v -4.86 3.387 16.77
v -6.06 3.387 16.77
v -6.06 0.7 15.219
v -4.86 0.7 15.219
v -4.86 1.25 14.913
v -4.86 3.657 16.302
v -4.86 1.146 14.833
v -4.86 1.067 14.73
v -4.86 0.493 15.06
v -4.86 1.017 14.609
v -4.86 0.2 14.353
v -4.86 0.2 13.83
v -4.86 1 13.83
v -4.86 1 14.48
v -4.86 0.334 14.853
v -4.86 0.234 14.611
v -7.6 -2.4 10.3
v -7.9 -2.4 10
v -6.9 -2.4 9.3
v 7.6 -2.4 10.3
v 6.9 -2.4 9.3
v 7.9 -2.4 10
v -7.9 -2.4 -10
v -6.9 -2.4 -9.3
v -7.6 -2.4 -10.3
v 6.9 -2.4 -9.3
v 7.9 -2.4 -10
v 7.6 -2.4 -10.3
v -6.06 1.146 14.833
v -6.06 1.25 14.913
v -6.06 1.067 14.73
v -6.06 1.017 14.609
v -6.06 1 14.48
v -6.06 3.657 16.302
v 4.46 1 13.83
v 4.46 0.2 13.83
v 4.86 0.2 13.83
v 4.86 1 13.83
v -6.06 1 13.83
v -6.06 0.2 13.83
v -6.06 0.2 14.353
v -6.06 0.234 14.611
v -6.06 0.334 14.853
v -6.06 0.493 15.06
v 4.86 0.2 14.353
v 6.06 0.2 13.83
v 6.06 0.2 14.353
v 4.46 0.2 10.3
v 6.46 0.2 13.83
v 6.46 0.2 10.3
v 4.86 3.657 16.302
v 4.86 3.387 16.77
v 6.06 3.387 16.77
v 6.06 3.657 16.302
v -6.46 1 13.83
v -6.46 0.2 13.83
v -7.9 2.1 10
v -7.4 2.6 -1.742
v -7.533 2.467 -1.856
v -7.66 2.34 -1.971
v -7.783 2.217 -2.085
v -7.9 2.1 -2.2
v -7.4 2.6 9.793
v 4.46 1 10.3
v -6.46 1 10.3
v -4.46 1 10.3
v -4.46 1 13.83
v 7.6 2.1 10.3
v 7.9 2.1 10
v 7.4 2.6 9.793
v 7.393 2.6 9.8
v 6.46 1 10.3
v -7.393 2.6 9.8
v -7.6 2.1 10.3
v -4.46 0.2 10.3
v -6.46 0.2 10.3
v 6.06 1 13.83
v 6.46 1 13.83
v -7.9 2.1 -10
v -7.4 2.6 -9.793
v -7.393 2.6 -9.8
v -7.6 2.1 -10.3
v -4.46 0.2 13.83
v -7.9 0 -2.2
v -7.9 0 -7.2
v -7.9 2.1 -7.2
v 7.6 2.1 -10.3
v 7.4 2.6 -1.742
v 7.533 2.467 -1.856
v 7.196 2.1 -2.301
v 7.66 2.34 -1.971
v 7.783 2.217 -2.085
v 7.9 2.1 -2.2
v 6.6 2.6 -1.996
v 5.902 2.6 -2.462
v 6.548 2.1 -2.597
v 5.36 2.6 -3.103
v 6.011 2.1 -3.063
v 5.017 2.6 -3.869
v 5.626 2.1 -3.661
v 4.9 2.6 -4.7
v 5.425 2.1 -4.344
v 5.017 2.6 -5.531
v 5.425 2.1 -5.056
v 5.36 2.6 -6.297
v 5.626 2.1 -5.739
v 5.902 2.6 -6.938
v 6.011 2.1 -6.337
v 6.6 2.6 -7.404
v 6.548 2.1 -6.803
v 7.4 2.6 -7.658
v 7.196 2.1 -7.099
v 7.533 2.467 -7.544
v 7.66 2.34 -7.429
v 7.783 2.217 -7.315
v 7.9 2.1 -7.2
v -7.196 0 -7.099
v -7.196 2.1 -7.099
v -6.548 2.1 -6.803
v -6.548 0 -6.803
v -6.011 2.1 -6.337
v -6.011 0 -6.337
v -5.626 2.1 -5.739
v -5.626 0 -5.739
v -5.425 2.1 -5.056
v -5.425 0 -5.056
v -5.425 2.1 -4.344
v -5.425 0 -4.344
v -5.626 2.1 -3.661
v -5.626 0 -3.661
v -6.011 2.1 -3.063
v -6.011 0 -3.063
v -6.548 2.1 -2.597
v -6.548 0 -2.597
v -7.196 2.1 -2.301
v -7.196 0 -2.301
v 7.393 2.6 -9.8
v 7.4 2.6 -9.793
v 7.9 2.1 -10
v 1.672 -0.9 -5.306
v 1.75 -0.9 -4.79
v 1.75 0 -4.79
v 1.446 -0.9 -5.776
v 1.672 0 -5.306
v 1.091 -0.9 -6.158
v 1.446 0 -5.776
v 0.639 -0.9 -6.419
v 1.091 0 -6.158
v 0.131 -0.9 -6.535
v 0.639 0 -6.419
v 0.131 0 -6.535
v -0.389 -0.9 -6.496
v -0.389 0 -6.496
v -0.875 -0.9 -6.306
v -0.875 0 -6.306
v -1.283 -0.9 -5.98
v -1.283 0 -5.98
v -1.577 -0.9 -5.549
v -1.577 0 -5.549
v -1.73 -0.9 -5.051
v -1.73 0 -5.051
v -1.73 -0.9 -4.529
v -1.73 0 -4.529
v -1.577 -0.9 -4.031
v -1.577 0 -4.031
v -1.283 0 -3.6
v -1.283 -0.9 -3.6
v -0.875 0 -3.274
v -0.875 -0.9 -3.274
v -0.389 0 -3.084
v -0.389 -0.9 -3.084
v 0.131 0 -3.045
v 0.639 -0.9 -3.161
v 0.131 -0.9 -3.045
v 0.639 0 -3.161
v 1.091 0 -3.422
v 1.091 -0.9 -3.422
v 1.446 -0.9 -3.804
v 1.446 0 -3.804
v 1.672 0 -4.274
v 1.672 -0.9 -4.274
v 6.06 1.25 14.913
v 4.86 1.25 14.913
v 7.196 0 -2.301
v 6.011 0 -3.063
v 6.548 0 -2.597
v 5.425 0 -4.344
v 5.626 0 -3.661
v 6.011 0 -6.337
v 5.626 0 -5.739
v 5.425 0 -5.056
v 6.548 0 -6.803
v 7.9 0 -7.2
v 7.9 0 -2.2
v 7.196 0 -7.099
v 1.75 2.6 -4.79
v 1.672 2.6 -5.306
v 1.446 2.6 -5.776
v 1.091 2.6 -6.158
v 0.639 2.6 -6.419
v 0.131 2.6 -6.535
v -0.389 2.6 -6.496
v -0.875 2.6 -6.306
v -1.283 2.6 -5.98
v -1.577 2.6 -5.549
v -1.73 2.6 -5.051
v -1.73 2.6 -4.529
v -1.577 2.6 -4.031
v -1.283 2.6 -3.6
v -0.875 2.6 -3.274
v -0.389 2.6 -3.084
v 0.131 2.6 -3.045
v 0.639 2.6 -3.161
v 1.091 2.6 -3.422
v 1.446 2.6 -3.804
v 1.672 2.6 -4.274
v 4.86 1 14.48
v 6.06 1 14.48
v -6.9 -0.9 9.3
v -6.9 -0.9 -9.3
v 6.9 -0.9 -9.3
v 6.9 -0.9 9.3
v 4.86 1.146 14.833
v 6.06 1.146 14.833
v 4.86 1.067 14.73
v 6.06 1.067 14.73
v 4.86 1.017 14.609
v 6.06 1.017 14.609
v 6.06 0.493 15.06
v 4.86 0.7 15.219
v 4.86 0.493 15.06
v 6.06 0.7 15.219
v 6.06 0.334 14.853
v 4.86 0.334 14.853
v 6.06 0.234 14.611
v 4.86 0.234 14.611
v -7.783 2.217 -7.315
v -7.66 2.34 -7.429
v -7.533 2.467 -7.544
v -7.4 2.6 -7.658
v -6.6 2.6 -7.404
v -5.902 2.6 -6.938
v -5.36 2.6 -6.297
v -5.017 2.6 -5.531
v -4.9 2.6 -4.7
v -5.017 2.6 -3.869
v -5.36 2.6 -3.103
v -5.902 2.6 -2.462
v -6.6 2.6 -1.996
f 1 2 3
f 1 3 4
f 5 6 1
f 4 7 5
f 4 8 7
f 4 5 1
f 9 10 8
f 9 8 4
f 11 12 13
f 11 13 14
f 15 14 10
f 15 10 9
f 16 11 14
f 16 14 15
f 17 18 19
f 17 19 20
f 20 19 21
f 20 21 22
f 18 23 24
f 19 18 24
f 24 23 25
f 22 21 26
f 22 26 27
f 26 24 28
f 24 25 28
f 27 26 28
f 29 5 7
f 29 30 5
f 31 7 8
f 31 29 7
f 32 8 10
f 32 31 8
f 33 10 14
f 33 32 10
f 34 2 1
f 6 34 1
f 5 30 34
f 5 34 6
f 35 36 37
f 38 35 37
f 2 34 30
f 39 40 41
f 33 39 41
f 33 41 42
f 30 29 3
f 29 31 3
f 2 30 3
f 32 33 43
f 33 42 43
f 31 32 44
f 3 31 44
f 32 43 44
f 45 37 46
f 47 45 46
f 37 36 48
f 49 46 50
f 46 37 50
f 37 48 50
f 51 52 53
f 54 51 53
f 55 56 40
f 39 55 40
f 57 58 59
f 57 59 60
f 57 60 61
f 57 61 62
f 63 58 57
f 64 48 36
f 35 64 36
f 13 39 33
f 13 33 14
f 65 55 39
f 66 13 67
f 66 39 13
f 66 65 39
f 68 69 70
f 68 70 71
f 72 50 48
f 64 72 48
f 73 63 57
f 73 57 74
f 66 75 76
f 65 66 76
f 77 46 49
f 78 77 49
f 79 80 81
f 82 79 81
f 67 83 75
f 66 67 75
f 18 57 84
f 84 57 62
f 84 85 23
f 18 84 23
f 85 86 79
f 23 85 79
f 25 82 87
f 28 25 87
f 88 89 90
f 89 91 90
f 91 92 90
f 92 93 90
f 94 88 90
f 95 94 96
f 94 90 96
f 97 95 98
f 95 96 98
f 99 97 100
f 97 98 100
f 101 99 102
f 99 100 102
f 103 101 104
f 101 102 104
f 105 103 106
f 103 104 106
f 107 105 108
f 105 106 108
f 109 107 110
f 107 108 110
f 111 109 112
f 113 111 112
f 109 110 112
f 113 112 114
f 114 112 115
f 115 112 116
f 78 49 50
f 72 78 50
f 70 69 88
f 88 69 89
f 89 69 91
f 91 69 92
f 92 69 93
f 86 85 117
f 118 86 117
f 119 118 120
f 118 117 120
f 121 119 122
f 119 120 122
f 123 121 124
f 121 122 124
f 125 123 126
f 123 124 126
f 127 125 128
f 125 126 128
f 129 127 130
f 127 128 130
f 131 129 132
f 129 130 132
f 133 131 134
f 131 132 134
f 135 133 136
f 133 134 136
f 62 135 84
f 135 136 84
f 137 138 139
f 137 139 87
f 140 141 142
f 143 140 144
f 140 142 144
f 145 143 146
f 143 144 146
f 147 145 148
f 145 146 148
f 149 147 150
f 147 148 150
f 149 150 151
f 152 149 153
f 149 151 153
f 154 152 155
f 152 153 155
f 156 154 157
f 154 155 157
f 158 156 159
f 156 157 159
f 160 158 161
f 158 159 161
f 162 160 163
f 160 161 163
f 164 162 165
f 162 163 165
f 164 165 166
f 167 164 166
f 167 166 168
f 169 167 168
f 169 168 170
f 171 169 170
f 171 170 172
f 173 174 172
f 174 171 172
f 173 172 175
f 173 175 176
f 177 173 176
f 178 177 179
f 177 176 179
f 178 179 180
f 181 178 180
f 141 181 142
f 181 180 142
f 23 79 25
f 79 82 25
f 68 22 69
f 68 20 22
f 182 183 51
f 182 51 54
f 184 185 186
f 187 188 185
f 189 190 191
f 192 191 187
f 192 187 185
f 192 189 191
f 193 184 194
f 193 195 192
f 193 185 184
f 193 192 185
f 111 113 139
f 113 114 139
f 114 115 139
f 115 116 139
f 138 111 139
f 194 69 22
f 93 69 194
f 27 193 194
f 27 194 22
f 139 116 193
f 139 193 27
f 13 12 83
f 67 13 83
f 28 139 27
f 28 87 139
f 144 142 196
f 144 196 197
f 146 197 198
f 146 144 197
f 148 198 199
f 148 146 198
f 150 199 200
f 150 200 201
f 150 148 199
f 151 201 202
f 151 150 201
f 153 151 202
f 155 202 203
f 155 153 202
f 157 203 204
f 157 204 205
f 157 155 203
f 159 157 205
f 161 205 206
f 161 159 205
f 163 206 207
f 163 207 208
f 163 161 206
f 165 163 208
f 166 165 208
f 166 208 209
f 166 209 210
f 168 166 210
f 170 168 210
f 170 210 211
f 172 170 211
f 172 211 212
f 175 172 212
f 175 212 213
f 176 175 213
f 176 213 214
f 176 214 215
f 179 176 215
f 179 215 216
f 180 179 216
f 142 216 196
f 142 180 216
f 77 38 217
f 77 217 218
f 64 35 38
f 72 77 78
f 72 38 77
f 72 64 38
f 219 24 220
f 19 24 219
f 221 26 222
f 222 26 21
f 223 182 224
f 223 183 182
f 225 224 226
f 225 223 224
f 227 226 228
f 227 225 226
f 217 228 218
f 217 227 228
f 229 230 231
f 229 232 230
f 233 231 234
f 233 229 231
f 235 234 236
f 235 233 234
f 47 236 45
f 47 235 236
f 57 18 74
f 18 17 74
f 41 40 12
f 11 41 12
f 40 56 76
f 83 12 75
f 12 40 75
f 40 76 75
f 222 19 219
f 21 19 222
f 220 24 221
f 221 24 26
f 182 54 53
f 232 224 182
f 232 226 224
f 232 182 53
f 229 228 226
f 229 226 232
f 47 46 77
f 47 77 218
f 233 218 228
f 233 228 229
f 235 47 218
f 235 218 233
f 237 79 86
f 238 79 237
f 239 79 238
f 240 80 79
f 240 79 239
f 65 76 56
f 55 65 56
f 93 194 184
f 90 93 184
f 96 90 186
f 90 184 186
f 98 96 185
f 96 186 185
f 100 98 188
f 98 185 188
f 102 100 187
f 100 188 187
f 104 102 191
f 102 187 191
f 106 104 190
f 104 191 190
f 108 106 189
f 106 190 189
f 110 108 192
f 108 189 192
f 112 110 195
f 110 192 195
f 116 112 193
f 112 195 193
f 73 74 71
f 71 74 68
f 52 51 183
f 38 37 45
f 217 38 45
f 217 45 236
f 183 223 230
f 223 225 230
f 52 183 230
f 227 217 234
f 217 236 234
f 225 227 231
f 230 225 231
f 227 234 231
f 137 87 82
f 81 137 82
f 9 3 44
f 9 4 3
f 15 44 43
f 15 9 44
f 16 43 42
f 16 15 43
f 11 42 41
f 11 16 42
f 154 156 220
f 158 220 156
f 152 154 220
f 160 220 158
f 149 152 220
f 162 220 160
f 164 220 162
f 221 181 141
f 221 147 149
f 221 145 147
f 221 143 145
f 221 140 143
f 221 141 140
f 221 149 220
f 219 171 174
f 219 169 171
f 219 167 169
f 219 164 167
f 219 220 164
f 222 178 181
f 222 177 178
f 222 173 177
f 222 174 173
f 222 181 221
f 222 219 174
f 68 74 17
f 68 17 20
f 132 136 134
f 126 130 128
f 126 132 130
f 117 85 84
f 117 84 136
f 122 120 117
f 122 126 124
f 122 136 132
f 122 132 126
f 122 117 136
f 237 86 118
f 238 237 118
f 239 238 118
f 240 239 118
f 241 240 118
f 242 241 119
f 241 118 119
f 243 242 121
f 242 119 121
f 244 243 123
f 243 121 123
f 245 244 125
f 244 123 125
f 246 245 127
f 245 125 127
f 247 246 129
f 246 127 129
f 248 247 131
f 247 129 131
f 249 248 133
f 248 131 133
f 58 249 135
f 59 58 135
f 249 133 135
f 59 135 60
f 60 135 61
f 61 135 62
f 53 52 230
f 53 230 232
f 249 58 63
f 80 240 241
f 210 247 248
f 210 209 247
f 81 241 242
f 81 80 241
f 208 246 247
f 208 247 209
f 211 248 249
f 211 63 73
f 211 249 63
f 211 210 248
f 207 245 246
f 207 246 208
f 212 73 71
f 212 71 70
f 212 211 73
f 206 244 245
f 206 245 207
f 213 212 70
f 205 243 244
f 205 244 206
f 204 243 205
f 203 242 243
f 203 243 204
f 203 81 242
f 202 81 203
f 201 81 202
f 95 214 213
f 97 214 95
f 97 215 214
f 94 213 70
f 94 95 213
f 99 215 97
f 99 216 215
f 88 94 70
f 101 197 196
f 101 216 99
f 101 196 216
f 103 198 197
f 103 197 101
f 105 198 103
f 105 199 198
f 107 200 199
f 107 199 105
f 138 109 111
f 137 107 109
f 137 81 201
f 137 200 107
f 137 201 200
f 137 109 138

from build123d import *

# Parameters (mm, degrees)
SKETCH_1_R          = 1.75
EXTRUDE_1_DEPTH     = 2.6
EXTRUDE_START       = -2.4
SKETCH_1_3_W        = 15.8
SKETCH_1_3_H        = 20.6
SKETCH_1_3_R        = 1.75
EXTRUDE_2_DEPTH     = 2.4
EXTRUDE_START_2     = 0.2
EXTRUDE_3_DEPTH     = 0.8
EXTRUDE_3_2_DEPTH   = 0.8
CHAMFER_1_SIZE      = 0.3
CHAMFER_2_SIZE      = 0.5
SKETCH_2_W          = 13.8
SKETCH_2_H          = 18.6
SKETCH_2_R          = 1.75
CUT_EXTRUDE_1_DEPTH = 1.5
SKETCH_3_W          = 1.2
SKETCH_3_H          = 0.54
EXTRUDE_6_DEPTH     = 3.68
FILLET_1_R          = 1
FILLET_2_R          = 1
FILLET_3_R          = 0.5
FILLET_4_R          = 0.5


with BuildPart() as part:
    # Эскиз1 → Бобышка-Вытянуть1 (new body)
    with BuildSketch(Plane(origin=(0, 0, 0), x_dir=(1, 0, 0), z_dir=(0, 1, 0))):
        with BuildLine():
            Line((6.46, -10.3), (7.9, -10.3))
            Line((7.9, -10.3), (7.9, 2.2))
            ThreePointArc((7.9, 2.2), (5.4, 4.7), (7.9, 7.2))
            Line((7.9, 7.2), (7.9, 10.3))
            Line((7.9, 10.3), (-7.9, 10.3))
            Line((-7.9, 10.3), (-7.9, 7.2))
            ThreePointArc((-7.9, 7.2), (-5.4, 4.7), (-7.9, 2.2))
            Line((-7.9, 2.2), (-7.9, -10.3))
            Line((-7.9, -10.3), (-6.46, -10.3))
            Line((-6.46, -10.3), (-4.46, -10.3))
            Line((-4.46, -10.3), (4.46, -10.3))
            Line((4.46, -10.3), (6.46, -10.3))
        make_face()
        with Locations((0, 4.79)):
            Circle(SKETCH_1_R, mode=Mode.SUBTRACT)
    extrude(amount=EXTRUDE_1_DEPTH)

    # Эскиз1<3> → Бобышка-Вытянуть2 (add)
    with BuildSketch(Plane(origin=(0, 0, 0), x_dir=(1, 0, 0), z_dir=(0, 1, 0)).offset(EXTRUDE_START)):
        Rectangle(SKETCH_1_3_W, SKETCH_1_3_H)
        with Locations((0, 4.79)):
            Circle(SKETCH_1_3_R, mode=Mode.SUBTRACT)
    extrude(amount=EXTRUDE_2_DEPTH)

    # Фаска1
    chamfer_1_edges = [part.edges().sort_by_distance(p)[0] for p in [
        (-7.9, 0.1, 10.3),
        (-7.9, 0.1, -10.3),
        (7.9, 0.1, -10.3),
        (7.9, 0.1, 10.3),
    ]]
    chamfer(chamfer_1_edges, length=CHAMFER_1_SIZE)

    # Фаска2
    chamfer_2_edges = [part.edges().sort_by_distance(p)[0] for p in [
        (-5.4, 2.6, -4.7),
        (-7.9, 2.6, -8.6),
        (-7.75, 2.6, -10.15),
        (0, 2.6, -10.3),
        (7.75, 2.6, -10.15),
        (7.9, 2.6, -8.6),
        (5.4, 2.6, -4.7),
        (7.9, 2.6, 3.9),
        (7.75, 2.6, 10.15),
        (0, 2.6, 10.3),
        (-7.75, 2.6, 10.15),
        (-7.9, 2.6, 3.9),
    ]]
    chamfer(chamfer_2_edges, length=CHAMFER_2_SIZE)

    # Эскиз2 → Вырез-Вытянуть1 (cut)
    with BuildSketch(Plane.XZ.offset(2.4)):
        Rectangle(SKETCH_2_W, SKETCH_2_H)
        with Locations((0, -4.79)):
            Circle(SKETCH_2_R, mode=Mode.SUBTRACT)
    extrude(amount=-CUT_EXTRUDE_1_DEPTH, mode=Mode.SUBTRACT)


with BuildPart() as body_2:
    # Эскиз1<4> → Бобышка-Вытянуть3 (new body)
    with BuildSketch(Plane(origin=(0, 0, 0), x_dir=(1, 0, 0), z_dir=(0, 1, 0)).offset(EXTRUDE_START_2)):
        Polygon((6.46, -13.83), (6.46, -10.3), (4.46, -10.3), (4.46, -13.83), (4.86, -13.83), (4.86, -14.93), (6.06, -14.93), (6.06, -13.83), align=None)
    extrude(amount=EXTRUDE_3_DEPTH)



with BuildPart() as body_3:
    # Эскиз1<4> → Extrude 3 2 (new body)
    with BuildSketch(Plane(origin=(0, 0, 0), x_dir=(1, 0, 0), z_dir=(0, 1, 0)).offset(EXTRUDE_START_2)):
        Polygon((-4.46, -13.83), (-4.46, -10.3), (-6.46, -10.3), (-6.46, -13.83), (-6.06, -13.83), (-6.06, -14.93), (-4.86, -14.93), (-4.86, -13.83), align=None)
    extrude(amount=EXTRUDE_3_2_DEPTH)


with BuildPart() as body_2_1:
    add(body_2.part)

    add(body_3.part)  # Бобышка-Вытянуть6 merges body 3
    # Эскиз3 → Бобышка-Вытянуть6 (add)
    with BuildSketch(Plane(origin=(0, 6.614879639, 3.81910254), x_dir=(1, 0, 0), z_dir=(0, -0.866025403784438, -0.500000000000001))):
        with Locations((-5.46, 12.559759279)):
            Rectangle(SKETCH_3_W, SKETCH_3_H)
        with Locations((5.46, 12.559759279)):
            Rectangle(SKETCH_3_W, SKETCH_3_H)
    extrude(amount=-EXTRUDE_6_DEPTH)

    # Скругление1
    fillet_1_edges = [body_2_1.edges().sort_by_distance(p)[0] for p in [
        (-5.46, 0.2, 14.93),
    ]]
    fillet(fillet_1_edges, radius=FILLET_1_R)

    # Скругление2
    fillet_2_edges = [body_2_1.edges().sort_by_distance(p)[0] for p in [
        (5.46, 0.2, 14.93),
    ]]
    fillet(fillet_2_edges, radius=FILLET_2_R)

    # Скругление3
    fillet_3_edges = [body_2_1.edges().sort_by_distance(p)[0] for p in [
        (5.46, 1, 14.768341925),
    ]]
    fillet(fillet_3_edges, radius=FILLET_3_R)

    # Скругление4
    fillet_4_edges = [body_2_1.edges().sort_by_distance(p)[0] for p in [
        (-5.46, 1, 14.768341925),
    ]]
    fillet(fillet_4_edges, radius=FILLET_4_R)


solid = Compound([part.part, body_2_1.part])
